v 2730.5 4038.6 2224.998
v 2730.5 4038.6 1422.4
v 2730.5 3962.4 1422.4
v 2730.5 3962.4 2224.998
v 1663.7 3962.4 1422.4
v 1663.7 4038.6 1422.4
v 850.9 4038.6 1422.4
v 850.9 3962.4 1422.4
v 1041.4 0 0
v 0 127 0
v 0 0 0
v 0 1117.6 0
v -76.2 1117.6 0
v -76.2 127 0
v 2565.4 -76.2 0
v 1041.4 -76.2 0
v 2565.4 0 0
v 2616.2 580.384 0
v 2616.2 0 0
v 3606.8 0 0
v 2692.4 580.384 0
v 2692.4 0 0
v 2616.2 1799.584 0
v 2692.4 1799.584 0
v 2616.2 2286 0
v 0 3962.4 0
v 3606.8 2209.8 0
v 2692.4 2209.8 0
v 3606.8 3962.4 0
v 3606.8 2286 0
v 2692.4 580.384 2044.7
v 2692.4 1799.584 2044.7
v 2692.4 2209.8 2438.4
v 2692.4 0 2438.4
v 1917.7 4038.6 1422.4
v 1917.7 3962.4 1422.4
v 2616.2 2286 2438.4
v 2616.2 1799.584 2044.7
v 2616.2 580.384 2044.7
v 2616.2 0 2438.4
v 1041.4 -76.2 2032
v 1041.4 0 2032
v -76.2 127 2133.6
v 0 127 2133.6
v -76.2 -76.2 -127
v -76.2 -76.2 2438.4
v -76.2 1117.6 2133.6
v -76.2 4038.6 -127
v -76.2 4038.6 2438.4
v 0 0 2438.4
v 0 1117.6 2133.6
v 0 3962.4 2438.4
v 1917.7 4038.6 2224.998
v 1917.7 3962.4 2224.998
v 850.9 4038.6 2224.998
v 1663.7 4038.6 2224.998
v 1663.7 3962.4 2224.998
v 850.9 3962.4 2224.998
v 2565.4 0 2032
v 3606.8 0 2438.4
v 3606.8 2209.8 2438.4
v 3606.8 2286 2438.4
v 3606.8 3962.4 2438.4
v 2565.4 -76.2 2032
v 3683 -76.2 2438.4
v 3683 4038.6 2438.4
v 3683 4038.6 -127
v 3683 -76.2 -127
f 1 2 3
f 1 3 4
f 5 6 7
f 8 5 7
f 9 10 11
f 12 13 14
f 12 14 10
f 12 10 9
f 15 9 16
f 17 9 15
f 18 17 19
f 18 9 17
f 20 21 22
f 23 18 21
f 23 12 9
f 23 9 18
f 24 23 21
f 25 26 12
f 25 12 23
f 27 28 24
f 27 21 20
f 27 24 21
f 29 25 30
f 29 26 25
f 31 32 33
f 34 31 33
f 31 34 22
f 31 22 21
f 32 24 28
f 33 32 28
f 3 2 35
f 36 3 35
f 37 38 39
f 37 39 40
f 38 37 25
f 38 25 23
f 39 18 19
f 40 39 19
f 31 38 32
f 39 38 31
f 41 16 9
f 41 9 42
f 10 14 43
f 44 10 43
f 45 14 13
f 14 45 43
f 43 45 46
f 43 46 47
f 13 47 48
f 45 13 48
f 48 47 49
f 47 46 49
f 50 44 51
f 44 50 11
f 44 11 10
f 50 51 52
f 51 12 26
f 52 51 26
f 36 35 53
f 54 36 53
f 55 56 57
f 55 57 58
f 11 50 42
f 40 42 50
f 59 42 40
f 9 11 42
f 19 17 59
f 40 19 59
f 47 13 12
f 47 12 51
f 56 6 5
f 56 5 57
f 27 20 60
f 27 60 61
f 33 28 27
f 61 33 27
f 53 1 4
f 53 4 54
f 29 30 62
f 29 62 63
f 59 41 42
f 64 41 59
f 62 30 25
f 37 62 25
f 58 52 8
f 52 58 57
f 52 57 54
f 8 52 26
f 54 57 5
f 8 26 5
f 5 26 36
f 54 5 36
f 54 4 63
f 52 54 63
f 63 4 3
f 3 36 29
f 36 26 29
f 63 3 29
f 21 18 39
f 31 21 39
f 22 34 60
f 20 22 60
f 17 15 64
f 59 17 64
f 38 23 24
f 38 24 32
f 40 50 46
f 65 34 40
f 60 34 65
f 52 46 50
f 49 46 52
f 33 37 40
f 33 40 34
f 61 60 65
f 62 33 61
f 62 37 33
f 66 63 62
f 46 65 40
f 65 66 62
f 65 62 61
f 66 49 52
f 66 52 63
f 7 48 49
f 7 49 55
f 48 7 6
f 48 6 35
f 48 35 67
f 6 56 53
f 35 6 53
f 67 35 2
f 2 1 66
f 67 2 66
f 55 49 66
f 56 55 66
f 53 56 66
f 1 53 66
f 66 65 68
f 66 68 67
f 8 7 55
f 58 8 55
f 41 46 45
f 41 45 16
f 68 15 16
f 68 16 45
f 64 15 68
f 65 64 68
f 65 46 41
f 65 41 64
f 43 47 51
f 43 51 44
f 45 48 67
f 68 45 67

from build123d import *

# Parameters (mm, degrees)
F0_W      = 3759.2
F0_H      = 4114.8
F0_W_2    = 3606.8
F0_H_2    = 3962.4
F1_DEPTH  = 2438.4
F2_W      = 990.6
F2_H      = 2133.6
F3_DEPTH  = 76.2
F4_W      = 812.8
F4_H      = 802.597539
F5_DEPTH  = 76.2
F6_W      = 1524
F6_H      = 2032
F7_DEPTH  = 76.2
F8_W      = 3759.2
F8_H      = 4114.8
F9_DEPTH  = 127
F11_DEPTH = 2438.4
F12_W     = 1219.2
F12_H     = 2044.7
F13_DEPTH = 76.2


with BuildPart() as f1:
    # F0 (on Top) → F1 (new body)
    with BuildSketch(Plane.XY):
        with Locations((1803.4, 1981.2)):
            Rectangle(F0_W, F0_H)
        with Locations((1803.4, 1981.2)):
            Rectangle(F0_W_2, F0_H_2, mode=Mode.SUBTRACT)
    extrude(amount=F1_DEPTH)

    # F2 (on face) → F3 (cut, through all)
    with BuildSketch(Plane(origin=(-76.2, 0, 0), x_dir=(0, -1, 0), z_dir=(-1, 0, 0))):
        with Locations((-622.3, 1066.8)):
            Rectangle(F2_W, F2_H)
    extrude(amount=-F3_DEPTH, mode=Mode.SUBTRACT)

    # F4 (on face) → F5 (cut, through all)
    with BuildSketch(Plane(origin=(0, 4038.6, 0), x_dir=(-1, 0, 0), z_dir=(0, 1, 0))):
        with Locations((-1257.3, 1823.698769)):
            Rectangle(F4_W, F4_H)
        with Locations((-2324.1, 1823.698769)):
            Rectangle(F4_W, F4_H)
    extrude(amount=-F5_DEPTH, mode=Mode.SUBTRACT)

    # F6 (on face) → F7 (cut, through all)
    with BuildSketch(Plane.XZ.offset(76.2)):
        with Locations((1803.4, 1016)):
            Rectangle(F6_W, F6_H)
    extrude(amount=-F7_DEPTH, mode=Mode.SUBTRACT)

    # F8 (on Top) → F9 (join)
    with BuildSketch(Plane.XY):
        with Locations((1803.4, 1981.2)):
            Rectangle(F8_W, F8_H)
    extrude(amount=-F9_DEPTH)

    # F10 (on face) → F11 (join)
    with BuildSketch(Plane.XY):
        Polygon((2616.2, 0), (2692.4, 0), (2692.4, 2209.8), (3606.8, 2209.8), (3606.8, 2286), (2616.2, 2286), align=None)
    extrude(amount=F11_DEPTH)

    # F12 (on face) → F13 (cut, through all)
    with BuildSketch(Plane(origin=(2616.2, 0, 0), x_dir=(0, -1, 0), z_dir=(-1, 0, 0))):
        with Locations((-1189.983554, 1022.35)):
            Rectangle(F12_W, F12_H)
    extrude(amount=-F13_DEPTH, mode=Mode.SUBTRACT)


solid = f1.part
